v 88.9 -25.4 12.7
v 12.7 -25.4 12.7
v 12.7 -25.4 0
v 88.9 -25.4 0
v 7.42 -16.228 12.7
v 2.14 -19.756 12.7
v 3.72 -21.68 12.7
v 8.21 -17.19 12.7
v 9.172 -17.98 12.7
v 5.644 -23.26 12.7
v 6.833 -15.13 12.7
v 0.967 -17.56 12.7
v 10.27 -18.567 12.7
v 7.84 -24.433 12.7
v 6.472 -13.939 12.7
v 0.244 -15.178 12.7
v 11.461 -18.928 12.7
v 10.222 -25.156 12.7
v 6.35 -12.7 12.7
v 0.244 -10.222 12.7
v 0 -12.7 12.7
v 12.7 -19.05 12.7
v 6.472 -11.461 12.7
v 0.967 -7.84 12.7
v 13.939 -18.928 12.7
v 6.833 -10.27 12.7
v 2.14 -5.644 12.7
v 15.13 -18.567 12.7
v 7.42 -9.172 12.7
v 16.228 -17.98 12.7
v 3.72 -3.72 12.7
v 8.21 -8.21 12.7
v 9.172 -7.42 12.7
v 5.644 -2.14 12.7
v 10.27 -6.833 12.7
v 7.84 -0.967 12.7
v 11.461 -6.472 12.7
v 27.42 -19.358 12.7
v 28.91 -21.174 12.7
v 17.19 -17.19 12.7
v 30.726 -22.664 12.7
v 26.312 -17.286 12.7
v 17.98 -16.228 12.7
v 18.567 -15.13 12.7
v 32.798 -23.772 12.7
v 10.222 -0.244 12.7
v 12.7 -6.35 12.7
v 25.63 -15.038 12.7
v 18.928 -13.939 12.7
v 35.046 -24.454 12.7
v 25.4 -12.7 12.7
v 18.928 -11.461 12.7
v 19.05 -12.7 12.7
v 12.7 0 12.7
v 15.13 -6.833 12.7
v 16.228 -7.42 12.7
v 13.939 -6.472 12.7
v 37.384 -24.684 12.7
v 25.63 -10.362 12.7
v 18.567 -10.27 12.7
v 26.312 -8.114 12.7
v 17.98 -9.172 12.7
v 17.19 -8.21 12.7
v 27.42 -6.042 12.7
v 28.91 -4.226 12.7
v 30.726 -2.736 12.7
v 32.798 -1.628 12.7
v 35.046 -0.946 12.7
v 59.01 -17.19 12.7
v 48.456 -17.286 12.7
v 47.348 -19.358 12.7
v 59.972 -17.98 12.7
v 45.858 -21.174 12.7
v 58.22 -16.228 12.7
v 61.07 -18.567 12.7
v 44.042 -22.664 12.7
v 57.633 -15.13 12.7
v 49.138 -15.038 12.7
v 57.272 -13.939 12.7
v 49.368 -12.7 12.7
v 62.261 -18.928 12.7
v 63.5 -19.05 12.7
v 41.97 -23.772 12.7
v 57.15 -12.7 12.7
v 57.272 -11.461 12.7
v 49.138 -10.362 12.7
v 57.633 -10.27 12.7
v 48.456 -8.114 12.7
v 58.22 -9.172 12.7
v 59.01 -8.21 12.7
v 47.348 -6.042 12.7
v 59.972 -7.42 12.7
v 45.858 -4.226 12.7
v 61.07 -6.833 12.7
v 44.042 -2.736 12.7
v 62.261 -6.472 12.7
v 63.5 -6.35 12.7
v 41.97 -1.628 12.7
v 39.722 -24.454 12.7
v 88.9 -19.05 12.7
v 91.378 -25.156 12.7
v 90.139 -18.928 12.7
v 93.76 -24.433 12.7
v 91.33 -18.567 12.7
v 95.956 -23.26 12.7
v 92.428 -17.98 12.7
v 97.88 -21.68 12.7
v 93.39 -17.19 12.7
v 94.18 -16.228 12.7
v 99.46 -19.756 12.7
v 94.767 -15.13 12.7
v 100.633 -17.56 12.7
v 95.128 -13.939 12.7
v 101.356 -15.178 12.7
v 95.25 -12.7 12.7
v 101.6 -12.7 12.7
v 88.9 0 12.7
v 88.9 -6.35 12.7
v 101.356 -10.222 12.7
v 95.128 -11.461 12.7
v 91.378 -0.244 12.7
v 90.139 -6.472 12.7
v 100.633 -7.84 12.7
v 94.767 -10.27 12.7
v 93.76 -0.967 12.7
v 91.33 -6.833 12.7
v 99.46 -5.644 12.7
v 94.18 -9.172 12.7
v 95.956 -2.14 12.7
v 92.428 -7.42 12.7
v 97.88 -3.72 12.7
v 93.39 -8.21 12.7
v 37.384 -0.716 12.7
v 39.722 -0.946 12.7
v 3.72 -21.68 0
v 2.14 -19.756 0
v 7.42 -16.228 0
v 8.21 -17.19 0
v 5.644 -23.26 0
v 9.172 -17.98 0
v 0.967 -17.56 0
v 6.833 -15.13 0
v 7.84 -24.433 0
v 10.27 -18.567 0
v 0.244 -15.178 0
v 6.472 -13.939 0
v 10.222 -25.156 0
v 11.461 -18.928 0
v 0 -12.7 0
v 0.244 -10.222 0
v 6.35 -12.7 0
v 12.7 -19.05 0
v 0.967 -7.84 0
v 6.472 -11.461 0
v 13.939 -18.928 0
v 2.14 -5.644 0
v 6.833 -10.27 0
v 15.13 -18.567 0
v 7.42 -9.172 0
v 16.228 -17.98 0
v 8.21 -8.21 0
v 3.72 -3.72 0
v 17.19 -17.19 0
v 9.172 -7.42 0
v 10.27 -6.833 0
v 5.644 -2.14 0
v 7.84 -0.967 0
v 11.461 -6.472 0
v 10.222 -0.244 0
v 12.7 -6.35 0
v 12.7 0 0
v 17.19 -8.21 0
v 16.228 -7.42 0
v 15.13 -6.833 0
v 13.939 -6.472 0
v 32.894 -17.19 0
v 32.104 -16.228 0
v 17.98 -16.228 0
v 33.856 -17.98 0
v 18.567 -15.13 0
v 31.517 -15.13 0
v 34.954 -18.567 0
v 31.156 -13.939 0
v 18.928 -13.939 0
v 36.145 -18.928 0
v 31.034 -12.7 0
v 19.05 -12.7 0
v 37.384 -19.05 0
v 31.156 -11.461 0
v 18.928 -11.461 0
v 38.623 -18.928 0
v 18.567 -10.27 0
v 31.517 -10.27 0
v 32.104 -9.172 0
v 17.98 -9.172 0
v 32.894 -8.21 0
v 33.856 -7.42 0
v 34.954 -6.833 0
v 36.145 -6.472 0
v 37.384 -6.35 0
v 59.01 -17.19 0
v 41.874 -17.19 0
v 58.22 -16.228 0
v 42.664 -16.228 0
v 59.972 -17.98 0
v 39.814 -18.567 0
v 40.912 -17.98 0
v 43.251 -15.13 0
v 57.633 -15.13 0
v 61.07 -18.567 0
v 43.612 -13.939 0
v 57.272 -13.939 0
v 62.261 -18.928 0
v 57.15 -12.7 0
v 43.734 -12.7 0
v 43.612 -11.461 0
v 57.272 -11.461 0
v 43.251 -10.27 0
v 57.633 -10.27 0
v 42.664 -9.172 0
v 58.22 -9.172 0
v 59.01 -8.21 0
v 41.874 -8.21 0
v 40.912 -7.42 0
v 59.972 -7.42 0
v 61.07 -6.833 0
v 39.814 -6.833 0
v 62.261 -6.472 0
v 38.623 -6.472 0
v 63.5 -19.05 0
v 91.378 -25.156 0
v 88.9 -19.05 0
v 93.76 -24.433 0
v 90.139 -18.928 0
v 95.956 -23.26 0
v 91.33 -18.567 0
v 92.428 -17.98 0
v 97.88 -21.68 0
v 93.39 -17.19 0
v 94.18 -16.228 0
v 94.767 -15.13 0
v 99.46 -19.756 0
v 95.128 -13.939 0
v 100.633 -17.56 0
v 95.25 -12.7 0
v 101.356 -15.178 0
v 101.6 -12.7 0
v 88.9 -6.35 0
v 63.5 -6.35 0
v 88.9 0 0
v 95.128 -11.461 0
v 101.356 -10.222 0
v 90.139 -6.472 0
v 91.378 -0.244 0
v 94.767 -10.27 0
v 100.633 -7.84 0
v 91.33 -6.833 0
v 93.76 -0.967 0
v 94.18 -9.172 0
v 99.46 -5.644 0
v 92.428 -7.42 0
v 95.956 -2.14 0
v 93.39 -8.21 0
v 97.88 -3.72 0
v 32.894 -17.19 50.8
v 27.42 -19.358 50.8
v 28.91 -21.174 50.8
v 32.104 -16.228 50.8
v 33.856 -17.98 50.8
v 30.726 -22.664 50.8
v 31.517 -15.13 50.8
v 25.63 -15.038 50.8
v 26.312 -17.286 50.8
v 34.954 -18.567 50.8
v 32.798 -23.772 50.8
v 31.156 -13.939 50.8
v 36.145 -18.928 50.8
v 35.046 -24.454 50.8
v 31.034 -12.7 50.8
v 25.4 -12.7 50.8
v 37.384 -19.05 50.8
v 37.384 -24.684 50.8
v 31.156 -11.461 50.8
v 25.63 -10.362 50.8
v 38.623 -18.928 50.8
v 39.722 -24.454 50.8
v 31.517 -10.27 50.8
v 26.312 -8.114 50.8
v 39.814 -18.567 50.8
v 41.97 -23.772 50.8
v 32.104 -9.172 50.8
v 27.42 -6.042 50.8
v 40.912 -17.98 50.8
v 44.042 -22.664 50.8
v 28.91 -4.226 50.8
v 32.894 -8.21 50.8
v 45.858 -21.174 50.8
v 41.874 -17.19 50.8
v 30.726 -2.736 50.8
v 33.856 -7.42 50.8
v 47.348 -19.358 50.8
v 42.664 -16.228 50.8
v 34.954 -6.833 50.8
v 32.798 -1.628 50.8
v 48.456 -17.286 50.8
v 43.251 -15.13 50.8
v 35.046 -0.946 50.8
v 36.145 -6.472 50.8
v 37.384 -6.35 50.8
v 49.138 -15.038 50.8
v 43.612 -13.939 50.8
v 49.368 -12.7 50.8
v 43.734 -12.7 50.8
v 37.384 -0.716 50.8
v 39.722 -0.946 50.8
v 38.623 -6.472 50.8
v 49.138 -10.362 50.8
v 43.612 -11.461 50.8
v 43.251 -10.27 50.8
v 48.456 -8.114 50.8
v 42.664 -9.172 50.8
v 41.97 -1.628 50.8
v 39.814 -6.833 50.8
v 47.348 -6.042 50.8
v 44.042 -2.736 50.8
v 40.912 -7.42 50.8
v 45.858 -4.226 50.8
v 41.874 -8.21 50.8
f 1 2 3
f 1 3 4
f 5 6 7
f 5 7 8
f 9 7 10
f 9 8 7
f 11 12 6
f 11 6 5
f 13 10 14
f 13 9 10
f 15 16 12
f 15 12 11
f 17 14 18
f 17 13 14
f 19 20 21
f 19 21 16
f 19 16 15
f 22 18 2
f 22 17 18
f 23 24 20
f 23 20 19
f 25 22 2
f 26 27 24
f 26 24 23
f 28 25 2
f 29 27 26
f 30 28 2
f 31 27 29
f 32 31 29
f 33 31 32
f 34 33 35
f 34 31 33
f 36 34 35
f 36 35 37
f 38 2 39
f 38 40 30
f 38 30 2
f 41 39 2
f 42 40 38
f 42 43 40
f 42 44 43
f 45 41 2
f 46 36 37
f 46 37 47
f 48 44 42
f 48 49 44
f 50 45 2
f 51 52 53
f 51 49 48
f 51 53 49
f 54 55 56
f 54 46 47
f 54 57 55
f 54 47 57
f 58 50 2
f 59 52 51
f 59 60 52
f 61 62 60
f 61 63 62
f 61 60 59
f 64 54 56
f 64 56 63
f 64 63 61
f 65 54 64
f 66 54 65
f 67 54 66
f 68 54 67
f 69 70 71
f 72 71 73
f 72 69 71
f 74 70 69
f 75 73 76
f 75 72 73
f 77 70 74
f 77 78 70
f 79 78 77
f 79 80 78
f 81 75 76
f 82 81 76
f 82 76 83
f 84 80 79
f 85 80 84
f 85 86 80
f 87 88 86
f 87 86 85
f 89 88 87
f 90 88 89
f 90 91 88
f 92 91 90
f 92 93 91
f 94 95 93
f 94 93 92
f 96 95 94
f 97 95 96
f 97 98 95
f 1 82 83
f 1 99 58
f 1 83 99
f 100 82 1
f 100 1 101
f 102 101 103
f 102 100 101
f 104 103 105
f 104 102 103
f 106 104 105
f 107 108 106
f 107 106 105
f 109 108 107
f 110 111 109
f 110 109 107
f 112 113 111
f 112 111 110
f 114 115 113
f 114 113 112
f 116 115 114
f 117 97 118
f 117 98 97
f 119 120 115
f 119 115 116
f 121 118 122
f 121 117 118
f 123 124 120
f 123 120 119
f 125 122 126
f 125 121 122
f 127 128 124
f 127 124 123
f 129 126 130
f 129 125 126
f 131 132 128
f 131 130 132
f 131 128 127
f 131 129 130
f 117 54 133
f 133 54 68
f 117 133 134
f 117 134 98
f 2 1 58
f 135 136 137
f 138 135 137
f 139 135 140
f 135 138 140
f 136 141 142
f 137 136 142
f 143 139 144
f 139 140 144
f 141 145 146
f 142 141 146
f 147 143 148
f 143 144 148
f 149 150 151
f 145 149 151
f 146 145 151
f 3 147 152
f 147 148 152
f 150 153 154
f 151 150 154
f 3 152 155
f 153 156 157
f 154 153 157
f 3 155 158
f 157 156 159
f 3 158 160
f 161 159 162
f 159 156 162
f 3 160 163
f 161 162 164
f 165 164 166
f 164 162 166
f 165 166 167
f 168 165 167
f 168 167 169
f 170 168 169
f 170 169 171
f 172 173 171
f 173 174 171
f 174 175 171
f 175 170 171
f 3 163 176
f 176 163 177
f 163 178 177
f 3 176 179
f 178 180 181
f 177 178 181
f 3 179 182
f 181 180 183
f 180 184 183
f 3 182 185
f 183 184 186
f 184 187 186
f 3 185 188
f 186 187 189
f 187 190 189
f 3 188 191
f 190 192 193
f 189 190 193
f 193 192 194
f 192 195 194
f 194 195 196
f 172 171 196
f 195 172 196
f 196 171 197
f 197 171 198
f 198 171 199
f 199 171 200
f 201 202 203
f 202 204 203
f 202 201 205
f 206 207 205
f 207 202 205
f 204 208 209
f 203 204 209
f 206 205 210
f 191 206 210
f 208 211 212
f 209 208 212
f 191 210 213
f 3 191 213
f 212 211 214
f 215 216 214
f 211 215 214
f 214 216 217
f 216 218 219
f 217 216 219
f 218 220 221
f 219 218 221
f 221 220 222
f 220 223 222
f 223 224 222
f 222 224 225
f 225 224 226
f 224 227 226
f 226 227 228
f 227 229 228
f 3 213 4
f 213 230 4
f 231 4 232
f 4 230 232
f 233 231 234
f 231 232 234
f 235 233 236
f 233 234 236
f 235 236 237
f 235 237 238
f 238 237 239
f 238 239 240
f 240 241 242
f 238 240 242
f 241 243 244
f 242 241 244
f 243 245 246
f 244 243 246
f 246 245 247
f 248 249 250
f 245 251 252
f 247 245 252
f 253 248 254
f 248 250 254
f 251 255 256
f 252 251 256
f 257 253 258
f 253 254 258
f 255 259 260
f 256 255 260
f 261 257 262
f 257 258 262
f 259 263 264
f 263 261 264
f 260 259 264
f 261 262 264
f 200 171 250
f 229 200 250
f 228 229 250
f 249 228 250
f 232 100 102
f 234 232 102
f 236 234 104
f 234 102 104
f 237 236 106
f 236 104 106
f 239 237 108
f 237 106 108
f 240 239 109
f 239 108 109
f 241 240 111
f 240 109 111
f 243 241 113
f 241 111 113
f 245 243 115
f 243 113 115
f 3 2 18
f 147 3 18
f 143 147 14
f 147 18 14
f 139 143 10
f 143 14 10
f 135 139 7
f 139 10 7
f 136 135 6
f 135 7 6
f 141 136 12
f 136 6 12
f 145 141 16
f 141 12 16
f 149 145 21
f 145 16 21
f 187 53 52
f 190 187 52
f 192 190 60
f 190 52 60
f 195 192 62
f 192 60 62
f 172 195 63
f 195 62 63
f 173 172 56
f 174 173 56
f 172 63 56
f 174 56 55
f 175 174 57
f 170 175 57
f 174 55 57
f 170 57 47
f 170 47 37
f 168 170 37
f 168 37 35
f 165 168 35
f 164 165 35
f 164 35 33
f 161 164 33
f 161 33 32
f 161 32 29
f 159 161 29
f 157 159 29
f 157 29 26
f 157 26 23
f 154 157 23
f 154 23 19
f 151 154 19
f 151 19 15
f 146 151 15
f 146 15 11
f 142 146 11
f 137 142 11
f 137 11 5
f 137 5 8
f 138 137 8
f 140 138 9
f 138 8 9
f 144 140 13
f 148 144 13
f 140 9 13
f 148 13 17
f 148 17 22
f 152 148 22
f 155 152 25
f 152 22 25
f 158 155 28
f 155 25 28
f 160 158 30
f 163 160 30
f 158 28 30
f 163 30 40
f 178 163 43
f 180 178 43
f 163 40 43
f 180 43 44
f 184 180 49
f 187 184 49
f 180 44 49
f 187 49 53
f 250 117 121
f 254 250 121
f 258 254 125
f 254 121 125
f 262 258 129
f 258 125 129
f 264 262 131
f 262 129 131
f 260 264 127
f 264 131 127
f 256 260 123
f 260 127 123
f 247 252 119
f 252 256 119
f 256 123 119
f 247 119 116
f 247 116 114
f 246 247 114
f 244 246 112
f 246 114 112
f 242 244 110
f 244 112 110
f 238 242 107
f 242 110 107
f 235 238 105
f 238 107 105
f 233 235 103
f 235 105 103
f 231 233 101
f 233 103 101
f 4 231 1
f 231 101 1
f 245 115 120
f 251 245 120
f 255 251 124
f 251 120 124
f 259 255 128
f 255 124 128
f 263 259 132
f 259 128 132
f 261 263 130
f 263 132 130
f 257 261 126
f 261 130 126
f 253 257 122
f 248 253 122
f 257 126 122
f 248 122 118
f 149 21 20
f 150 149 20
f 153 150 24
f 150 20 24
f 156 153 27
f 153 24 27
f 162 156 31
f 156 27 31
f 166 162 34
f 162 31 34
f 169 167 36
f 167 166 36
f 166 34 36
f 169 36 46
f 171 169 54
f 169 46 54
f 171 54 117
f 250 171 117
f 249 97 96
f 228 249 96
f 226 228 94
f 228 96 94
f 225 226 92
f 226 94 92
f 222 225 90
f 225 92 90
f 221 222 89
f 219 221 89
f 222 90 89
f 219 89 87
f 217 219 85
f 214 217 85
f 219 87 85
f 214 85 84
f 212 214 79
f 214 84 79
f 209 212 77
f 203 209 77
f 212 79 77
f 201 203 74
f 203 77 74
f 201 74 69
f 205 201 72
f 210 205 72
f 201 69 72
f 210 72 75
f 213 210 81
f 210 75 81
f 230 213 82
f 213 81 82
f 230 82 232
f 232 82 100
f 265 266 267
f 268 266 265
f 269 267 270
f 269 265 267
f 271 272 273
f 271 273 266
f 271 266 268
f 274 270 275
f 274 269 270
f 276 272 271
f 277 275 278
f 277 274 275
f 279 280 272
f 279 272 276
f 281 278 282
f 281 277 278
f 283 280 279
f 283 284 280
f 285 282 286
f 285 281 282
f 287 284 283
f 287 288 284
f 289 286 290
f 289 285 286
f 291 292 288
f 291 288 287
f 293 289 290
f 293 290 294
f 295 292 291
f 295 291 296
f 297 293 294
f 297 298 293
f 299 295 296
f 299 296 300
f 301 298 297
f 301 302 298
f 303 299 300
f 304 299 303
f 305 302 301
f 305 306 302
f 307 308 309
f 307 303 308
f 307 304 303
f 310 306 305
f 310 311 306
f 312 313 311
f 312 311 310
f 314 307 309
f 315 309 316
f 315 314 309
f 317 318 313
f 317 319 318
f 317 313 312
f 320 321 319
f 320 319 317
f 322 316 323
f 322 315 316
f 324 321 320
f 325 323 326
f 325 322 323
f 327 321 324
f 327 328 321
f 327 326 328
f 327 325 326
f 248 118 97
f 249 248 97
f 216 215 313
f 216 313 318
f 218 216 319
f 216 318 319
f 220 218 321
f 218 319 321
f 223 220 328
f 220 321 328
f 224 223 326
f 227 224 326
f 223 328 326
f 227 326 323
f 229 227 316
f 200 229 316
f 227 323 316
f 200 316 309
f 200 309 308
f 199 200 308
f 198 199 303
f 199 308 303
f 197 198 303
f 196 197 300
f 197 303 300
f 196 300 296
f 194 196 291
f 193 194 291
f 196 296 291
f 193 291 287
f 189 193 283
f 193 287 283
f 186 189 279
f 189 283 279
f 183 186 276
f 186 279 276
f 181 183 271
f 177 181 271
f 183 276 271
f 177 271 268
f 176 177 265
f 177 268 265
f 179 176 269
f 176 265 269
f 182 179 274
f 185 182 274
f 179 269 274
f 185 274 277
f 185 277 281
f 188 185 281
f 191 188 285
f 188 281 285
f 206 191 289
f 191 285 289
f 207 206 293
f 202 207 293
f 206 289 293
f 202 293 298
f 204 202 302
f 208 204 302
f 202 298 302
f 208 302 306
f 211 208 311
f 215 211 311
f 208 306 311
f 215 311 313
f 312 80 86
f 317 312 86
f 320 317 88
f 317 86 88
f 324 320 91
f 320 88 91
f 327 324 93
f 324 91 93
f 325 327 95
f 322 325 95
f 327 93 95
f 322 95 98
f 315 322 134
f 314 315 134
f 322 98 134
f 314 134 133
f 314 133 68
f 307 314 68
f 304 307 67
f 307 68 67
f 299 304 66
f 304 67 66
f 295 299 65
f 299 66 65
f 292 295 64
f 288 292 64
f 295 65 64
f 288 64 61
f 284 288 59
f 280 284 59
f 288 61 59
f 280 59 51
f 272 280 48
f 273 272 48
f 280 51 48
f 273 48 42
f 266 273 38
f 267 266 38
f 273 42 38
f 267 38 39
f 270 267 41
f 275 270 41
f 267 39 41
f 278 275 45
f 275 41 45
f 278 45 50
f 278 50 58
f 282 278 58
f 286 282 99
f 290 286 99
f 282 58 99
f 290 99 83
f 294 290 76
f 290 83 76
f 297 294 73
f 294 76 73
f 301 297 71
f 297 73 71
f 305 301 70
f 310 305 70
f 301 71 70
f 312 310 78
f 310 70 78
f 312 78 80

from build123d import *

# Parameters (mm, degrees)
F0_W      = 101.6
F0_H      = 12.7
F1_DEPTH  = 25.4
F3_DEPTH  = 25.4
F5_DEPTH  = 25.4
F6_R      = 6.35
F7_DEPTH  = 25.4
F8_R      = 11.983933
F9_DEPTH  = 38.1
F10_R     = 6.35
F11_DEPTH = 50.8
F13_DEPTH = 12.7


with BuildPart() as f1:
    # F0 (on Front) → F1 (new body)
    with BuildSketch(Plane.XZ):
        with Locations((50.8, 6.35)):
            Rectangle(F0_W, F0_H)
    extrude(amount=F1_DEPTH)

    # F2 (on face) → F3 (cut)
    with BuildSketch(Plane.XY.offset(12.7)):
        with BuildLine():
            ThreePointArc((101.6, -12.7), (97.880256, -21.680256), (88.9, -25.4))
            Line((88.9, -25.4), (101.6, -25.4))
            Line((101.6, -25.4), (101.6, -12.7))
        make_face()
        with BuildLine():
            ThreePointArc((88.9, 0), (97.880256, -3.719744), (101.6, -12.7))
            Line((101.6, -12.7), (101.6, 0))
            Line((101.6, 0), (88.9, 0))
        make_face()
    extrude(amount=-F3_DEPTH, mode=Mode.SUBTRACT)

    # F4 (on face) → F5 (cut)
    with BuildSketch(Plane.XY.offset(12.7)):
        with BuildLine():
            ThreePointArc((12.7, -25.4), (3.719744, -21.680256), (0, -12.7))
            Line((0, -12.7), (0, -25.4))
            Line((0, -25.4), (12.7, -25.4))
        make_face()
        with BuildLine():
            ThreePointArc((0, -12.7), (3.719744, -3.719744), (12.7, 0))
            Line((12.7, 0), (0, 0))
            Line((0, 0), (0, -12.7))
        make_face()
    extrude(amount=-F5_DEPTH, mode=Mode.SUBTRACT)

    # F6 (on face) → F7 (cut)
    with BuildSketch(Plane.XY.offset(12.7)):
        with Locations((12.7, -12.7)):
            Circle(F6_R)
    extrude(amount=-F7_DEPTH, mode=Mode.SUBTRACT)

    # F8 (on face) → F9 (join)
    with BuildSketch(Plane.XY.offset(12.7)):
        with Locations((37.383933, -12.7)):
            Circle(F8_R)
    extrude(amount=F9_DEPTH)

    # F10 (on face) → F11 (cut)
    with BuildSketch(Plane.XY.offset(50.8)):
        with Locations((37.383933, -12.7)):
            Circle(F10_R)
    extrude(amount=-F11_DEPTH, mode=Mode.SUBTRACT)

    # F12 (on face) → F13 (cut)
    with BuildSketch(Plane.XY.offset(12.7)):
        with BuildLine():
            ThreePointArc((63.5, -19.05), (67.990128, -17.190128), (69.85, -12.7))
            ThreePointArc((69.85, -12.7), (67.990128, -8.209872), (63.5, -6.35))
            ThreePointArc((63.5, -6.35), (57.15, -12.7), (63.5, -19.05))
        make_face()
        with BuildLine():
            ThreePointArc((63.5, -6.35), (67.990128, -8.209872), (69.85, -12.7))
            ThreePointArc((69.85, -12.7), (67.990128, -17.190128), (63.5, -19.05))
            Line((63.5, -19.05), (88.9, -19.05))
            ThreePointArc((88.9, -19.05), (82.55, -12.7), (88.9, -6.35))
            Line((88.9, -6.35), (63.5, -6.35))
        make_face()
        with BuildLine():
            ThreePointArc((95.25, -12.7), (93.390128, -8.209872), (88.9, -6.35))
            ThreePointArc((88.9, -6.35), (82.55, -12.7), (88.9, -19.05))
            ThreePointArc((88.9, -19.05), (93.390128, -17.190128), (95.25, -12.7))
        make_face()
    extrude(amount=-F13_DEPTH, mode=Mode.SUBTRACT)


solid = f1.part
